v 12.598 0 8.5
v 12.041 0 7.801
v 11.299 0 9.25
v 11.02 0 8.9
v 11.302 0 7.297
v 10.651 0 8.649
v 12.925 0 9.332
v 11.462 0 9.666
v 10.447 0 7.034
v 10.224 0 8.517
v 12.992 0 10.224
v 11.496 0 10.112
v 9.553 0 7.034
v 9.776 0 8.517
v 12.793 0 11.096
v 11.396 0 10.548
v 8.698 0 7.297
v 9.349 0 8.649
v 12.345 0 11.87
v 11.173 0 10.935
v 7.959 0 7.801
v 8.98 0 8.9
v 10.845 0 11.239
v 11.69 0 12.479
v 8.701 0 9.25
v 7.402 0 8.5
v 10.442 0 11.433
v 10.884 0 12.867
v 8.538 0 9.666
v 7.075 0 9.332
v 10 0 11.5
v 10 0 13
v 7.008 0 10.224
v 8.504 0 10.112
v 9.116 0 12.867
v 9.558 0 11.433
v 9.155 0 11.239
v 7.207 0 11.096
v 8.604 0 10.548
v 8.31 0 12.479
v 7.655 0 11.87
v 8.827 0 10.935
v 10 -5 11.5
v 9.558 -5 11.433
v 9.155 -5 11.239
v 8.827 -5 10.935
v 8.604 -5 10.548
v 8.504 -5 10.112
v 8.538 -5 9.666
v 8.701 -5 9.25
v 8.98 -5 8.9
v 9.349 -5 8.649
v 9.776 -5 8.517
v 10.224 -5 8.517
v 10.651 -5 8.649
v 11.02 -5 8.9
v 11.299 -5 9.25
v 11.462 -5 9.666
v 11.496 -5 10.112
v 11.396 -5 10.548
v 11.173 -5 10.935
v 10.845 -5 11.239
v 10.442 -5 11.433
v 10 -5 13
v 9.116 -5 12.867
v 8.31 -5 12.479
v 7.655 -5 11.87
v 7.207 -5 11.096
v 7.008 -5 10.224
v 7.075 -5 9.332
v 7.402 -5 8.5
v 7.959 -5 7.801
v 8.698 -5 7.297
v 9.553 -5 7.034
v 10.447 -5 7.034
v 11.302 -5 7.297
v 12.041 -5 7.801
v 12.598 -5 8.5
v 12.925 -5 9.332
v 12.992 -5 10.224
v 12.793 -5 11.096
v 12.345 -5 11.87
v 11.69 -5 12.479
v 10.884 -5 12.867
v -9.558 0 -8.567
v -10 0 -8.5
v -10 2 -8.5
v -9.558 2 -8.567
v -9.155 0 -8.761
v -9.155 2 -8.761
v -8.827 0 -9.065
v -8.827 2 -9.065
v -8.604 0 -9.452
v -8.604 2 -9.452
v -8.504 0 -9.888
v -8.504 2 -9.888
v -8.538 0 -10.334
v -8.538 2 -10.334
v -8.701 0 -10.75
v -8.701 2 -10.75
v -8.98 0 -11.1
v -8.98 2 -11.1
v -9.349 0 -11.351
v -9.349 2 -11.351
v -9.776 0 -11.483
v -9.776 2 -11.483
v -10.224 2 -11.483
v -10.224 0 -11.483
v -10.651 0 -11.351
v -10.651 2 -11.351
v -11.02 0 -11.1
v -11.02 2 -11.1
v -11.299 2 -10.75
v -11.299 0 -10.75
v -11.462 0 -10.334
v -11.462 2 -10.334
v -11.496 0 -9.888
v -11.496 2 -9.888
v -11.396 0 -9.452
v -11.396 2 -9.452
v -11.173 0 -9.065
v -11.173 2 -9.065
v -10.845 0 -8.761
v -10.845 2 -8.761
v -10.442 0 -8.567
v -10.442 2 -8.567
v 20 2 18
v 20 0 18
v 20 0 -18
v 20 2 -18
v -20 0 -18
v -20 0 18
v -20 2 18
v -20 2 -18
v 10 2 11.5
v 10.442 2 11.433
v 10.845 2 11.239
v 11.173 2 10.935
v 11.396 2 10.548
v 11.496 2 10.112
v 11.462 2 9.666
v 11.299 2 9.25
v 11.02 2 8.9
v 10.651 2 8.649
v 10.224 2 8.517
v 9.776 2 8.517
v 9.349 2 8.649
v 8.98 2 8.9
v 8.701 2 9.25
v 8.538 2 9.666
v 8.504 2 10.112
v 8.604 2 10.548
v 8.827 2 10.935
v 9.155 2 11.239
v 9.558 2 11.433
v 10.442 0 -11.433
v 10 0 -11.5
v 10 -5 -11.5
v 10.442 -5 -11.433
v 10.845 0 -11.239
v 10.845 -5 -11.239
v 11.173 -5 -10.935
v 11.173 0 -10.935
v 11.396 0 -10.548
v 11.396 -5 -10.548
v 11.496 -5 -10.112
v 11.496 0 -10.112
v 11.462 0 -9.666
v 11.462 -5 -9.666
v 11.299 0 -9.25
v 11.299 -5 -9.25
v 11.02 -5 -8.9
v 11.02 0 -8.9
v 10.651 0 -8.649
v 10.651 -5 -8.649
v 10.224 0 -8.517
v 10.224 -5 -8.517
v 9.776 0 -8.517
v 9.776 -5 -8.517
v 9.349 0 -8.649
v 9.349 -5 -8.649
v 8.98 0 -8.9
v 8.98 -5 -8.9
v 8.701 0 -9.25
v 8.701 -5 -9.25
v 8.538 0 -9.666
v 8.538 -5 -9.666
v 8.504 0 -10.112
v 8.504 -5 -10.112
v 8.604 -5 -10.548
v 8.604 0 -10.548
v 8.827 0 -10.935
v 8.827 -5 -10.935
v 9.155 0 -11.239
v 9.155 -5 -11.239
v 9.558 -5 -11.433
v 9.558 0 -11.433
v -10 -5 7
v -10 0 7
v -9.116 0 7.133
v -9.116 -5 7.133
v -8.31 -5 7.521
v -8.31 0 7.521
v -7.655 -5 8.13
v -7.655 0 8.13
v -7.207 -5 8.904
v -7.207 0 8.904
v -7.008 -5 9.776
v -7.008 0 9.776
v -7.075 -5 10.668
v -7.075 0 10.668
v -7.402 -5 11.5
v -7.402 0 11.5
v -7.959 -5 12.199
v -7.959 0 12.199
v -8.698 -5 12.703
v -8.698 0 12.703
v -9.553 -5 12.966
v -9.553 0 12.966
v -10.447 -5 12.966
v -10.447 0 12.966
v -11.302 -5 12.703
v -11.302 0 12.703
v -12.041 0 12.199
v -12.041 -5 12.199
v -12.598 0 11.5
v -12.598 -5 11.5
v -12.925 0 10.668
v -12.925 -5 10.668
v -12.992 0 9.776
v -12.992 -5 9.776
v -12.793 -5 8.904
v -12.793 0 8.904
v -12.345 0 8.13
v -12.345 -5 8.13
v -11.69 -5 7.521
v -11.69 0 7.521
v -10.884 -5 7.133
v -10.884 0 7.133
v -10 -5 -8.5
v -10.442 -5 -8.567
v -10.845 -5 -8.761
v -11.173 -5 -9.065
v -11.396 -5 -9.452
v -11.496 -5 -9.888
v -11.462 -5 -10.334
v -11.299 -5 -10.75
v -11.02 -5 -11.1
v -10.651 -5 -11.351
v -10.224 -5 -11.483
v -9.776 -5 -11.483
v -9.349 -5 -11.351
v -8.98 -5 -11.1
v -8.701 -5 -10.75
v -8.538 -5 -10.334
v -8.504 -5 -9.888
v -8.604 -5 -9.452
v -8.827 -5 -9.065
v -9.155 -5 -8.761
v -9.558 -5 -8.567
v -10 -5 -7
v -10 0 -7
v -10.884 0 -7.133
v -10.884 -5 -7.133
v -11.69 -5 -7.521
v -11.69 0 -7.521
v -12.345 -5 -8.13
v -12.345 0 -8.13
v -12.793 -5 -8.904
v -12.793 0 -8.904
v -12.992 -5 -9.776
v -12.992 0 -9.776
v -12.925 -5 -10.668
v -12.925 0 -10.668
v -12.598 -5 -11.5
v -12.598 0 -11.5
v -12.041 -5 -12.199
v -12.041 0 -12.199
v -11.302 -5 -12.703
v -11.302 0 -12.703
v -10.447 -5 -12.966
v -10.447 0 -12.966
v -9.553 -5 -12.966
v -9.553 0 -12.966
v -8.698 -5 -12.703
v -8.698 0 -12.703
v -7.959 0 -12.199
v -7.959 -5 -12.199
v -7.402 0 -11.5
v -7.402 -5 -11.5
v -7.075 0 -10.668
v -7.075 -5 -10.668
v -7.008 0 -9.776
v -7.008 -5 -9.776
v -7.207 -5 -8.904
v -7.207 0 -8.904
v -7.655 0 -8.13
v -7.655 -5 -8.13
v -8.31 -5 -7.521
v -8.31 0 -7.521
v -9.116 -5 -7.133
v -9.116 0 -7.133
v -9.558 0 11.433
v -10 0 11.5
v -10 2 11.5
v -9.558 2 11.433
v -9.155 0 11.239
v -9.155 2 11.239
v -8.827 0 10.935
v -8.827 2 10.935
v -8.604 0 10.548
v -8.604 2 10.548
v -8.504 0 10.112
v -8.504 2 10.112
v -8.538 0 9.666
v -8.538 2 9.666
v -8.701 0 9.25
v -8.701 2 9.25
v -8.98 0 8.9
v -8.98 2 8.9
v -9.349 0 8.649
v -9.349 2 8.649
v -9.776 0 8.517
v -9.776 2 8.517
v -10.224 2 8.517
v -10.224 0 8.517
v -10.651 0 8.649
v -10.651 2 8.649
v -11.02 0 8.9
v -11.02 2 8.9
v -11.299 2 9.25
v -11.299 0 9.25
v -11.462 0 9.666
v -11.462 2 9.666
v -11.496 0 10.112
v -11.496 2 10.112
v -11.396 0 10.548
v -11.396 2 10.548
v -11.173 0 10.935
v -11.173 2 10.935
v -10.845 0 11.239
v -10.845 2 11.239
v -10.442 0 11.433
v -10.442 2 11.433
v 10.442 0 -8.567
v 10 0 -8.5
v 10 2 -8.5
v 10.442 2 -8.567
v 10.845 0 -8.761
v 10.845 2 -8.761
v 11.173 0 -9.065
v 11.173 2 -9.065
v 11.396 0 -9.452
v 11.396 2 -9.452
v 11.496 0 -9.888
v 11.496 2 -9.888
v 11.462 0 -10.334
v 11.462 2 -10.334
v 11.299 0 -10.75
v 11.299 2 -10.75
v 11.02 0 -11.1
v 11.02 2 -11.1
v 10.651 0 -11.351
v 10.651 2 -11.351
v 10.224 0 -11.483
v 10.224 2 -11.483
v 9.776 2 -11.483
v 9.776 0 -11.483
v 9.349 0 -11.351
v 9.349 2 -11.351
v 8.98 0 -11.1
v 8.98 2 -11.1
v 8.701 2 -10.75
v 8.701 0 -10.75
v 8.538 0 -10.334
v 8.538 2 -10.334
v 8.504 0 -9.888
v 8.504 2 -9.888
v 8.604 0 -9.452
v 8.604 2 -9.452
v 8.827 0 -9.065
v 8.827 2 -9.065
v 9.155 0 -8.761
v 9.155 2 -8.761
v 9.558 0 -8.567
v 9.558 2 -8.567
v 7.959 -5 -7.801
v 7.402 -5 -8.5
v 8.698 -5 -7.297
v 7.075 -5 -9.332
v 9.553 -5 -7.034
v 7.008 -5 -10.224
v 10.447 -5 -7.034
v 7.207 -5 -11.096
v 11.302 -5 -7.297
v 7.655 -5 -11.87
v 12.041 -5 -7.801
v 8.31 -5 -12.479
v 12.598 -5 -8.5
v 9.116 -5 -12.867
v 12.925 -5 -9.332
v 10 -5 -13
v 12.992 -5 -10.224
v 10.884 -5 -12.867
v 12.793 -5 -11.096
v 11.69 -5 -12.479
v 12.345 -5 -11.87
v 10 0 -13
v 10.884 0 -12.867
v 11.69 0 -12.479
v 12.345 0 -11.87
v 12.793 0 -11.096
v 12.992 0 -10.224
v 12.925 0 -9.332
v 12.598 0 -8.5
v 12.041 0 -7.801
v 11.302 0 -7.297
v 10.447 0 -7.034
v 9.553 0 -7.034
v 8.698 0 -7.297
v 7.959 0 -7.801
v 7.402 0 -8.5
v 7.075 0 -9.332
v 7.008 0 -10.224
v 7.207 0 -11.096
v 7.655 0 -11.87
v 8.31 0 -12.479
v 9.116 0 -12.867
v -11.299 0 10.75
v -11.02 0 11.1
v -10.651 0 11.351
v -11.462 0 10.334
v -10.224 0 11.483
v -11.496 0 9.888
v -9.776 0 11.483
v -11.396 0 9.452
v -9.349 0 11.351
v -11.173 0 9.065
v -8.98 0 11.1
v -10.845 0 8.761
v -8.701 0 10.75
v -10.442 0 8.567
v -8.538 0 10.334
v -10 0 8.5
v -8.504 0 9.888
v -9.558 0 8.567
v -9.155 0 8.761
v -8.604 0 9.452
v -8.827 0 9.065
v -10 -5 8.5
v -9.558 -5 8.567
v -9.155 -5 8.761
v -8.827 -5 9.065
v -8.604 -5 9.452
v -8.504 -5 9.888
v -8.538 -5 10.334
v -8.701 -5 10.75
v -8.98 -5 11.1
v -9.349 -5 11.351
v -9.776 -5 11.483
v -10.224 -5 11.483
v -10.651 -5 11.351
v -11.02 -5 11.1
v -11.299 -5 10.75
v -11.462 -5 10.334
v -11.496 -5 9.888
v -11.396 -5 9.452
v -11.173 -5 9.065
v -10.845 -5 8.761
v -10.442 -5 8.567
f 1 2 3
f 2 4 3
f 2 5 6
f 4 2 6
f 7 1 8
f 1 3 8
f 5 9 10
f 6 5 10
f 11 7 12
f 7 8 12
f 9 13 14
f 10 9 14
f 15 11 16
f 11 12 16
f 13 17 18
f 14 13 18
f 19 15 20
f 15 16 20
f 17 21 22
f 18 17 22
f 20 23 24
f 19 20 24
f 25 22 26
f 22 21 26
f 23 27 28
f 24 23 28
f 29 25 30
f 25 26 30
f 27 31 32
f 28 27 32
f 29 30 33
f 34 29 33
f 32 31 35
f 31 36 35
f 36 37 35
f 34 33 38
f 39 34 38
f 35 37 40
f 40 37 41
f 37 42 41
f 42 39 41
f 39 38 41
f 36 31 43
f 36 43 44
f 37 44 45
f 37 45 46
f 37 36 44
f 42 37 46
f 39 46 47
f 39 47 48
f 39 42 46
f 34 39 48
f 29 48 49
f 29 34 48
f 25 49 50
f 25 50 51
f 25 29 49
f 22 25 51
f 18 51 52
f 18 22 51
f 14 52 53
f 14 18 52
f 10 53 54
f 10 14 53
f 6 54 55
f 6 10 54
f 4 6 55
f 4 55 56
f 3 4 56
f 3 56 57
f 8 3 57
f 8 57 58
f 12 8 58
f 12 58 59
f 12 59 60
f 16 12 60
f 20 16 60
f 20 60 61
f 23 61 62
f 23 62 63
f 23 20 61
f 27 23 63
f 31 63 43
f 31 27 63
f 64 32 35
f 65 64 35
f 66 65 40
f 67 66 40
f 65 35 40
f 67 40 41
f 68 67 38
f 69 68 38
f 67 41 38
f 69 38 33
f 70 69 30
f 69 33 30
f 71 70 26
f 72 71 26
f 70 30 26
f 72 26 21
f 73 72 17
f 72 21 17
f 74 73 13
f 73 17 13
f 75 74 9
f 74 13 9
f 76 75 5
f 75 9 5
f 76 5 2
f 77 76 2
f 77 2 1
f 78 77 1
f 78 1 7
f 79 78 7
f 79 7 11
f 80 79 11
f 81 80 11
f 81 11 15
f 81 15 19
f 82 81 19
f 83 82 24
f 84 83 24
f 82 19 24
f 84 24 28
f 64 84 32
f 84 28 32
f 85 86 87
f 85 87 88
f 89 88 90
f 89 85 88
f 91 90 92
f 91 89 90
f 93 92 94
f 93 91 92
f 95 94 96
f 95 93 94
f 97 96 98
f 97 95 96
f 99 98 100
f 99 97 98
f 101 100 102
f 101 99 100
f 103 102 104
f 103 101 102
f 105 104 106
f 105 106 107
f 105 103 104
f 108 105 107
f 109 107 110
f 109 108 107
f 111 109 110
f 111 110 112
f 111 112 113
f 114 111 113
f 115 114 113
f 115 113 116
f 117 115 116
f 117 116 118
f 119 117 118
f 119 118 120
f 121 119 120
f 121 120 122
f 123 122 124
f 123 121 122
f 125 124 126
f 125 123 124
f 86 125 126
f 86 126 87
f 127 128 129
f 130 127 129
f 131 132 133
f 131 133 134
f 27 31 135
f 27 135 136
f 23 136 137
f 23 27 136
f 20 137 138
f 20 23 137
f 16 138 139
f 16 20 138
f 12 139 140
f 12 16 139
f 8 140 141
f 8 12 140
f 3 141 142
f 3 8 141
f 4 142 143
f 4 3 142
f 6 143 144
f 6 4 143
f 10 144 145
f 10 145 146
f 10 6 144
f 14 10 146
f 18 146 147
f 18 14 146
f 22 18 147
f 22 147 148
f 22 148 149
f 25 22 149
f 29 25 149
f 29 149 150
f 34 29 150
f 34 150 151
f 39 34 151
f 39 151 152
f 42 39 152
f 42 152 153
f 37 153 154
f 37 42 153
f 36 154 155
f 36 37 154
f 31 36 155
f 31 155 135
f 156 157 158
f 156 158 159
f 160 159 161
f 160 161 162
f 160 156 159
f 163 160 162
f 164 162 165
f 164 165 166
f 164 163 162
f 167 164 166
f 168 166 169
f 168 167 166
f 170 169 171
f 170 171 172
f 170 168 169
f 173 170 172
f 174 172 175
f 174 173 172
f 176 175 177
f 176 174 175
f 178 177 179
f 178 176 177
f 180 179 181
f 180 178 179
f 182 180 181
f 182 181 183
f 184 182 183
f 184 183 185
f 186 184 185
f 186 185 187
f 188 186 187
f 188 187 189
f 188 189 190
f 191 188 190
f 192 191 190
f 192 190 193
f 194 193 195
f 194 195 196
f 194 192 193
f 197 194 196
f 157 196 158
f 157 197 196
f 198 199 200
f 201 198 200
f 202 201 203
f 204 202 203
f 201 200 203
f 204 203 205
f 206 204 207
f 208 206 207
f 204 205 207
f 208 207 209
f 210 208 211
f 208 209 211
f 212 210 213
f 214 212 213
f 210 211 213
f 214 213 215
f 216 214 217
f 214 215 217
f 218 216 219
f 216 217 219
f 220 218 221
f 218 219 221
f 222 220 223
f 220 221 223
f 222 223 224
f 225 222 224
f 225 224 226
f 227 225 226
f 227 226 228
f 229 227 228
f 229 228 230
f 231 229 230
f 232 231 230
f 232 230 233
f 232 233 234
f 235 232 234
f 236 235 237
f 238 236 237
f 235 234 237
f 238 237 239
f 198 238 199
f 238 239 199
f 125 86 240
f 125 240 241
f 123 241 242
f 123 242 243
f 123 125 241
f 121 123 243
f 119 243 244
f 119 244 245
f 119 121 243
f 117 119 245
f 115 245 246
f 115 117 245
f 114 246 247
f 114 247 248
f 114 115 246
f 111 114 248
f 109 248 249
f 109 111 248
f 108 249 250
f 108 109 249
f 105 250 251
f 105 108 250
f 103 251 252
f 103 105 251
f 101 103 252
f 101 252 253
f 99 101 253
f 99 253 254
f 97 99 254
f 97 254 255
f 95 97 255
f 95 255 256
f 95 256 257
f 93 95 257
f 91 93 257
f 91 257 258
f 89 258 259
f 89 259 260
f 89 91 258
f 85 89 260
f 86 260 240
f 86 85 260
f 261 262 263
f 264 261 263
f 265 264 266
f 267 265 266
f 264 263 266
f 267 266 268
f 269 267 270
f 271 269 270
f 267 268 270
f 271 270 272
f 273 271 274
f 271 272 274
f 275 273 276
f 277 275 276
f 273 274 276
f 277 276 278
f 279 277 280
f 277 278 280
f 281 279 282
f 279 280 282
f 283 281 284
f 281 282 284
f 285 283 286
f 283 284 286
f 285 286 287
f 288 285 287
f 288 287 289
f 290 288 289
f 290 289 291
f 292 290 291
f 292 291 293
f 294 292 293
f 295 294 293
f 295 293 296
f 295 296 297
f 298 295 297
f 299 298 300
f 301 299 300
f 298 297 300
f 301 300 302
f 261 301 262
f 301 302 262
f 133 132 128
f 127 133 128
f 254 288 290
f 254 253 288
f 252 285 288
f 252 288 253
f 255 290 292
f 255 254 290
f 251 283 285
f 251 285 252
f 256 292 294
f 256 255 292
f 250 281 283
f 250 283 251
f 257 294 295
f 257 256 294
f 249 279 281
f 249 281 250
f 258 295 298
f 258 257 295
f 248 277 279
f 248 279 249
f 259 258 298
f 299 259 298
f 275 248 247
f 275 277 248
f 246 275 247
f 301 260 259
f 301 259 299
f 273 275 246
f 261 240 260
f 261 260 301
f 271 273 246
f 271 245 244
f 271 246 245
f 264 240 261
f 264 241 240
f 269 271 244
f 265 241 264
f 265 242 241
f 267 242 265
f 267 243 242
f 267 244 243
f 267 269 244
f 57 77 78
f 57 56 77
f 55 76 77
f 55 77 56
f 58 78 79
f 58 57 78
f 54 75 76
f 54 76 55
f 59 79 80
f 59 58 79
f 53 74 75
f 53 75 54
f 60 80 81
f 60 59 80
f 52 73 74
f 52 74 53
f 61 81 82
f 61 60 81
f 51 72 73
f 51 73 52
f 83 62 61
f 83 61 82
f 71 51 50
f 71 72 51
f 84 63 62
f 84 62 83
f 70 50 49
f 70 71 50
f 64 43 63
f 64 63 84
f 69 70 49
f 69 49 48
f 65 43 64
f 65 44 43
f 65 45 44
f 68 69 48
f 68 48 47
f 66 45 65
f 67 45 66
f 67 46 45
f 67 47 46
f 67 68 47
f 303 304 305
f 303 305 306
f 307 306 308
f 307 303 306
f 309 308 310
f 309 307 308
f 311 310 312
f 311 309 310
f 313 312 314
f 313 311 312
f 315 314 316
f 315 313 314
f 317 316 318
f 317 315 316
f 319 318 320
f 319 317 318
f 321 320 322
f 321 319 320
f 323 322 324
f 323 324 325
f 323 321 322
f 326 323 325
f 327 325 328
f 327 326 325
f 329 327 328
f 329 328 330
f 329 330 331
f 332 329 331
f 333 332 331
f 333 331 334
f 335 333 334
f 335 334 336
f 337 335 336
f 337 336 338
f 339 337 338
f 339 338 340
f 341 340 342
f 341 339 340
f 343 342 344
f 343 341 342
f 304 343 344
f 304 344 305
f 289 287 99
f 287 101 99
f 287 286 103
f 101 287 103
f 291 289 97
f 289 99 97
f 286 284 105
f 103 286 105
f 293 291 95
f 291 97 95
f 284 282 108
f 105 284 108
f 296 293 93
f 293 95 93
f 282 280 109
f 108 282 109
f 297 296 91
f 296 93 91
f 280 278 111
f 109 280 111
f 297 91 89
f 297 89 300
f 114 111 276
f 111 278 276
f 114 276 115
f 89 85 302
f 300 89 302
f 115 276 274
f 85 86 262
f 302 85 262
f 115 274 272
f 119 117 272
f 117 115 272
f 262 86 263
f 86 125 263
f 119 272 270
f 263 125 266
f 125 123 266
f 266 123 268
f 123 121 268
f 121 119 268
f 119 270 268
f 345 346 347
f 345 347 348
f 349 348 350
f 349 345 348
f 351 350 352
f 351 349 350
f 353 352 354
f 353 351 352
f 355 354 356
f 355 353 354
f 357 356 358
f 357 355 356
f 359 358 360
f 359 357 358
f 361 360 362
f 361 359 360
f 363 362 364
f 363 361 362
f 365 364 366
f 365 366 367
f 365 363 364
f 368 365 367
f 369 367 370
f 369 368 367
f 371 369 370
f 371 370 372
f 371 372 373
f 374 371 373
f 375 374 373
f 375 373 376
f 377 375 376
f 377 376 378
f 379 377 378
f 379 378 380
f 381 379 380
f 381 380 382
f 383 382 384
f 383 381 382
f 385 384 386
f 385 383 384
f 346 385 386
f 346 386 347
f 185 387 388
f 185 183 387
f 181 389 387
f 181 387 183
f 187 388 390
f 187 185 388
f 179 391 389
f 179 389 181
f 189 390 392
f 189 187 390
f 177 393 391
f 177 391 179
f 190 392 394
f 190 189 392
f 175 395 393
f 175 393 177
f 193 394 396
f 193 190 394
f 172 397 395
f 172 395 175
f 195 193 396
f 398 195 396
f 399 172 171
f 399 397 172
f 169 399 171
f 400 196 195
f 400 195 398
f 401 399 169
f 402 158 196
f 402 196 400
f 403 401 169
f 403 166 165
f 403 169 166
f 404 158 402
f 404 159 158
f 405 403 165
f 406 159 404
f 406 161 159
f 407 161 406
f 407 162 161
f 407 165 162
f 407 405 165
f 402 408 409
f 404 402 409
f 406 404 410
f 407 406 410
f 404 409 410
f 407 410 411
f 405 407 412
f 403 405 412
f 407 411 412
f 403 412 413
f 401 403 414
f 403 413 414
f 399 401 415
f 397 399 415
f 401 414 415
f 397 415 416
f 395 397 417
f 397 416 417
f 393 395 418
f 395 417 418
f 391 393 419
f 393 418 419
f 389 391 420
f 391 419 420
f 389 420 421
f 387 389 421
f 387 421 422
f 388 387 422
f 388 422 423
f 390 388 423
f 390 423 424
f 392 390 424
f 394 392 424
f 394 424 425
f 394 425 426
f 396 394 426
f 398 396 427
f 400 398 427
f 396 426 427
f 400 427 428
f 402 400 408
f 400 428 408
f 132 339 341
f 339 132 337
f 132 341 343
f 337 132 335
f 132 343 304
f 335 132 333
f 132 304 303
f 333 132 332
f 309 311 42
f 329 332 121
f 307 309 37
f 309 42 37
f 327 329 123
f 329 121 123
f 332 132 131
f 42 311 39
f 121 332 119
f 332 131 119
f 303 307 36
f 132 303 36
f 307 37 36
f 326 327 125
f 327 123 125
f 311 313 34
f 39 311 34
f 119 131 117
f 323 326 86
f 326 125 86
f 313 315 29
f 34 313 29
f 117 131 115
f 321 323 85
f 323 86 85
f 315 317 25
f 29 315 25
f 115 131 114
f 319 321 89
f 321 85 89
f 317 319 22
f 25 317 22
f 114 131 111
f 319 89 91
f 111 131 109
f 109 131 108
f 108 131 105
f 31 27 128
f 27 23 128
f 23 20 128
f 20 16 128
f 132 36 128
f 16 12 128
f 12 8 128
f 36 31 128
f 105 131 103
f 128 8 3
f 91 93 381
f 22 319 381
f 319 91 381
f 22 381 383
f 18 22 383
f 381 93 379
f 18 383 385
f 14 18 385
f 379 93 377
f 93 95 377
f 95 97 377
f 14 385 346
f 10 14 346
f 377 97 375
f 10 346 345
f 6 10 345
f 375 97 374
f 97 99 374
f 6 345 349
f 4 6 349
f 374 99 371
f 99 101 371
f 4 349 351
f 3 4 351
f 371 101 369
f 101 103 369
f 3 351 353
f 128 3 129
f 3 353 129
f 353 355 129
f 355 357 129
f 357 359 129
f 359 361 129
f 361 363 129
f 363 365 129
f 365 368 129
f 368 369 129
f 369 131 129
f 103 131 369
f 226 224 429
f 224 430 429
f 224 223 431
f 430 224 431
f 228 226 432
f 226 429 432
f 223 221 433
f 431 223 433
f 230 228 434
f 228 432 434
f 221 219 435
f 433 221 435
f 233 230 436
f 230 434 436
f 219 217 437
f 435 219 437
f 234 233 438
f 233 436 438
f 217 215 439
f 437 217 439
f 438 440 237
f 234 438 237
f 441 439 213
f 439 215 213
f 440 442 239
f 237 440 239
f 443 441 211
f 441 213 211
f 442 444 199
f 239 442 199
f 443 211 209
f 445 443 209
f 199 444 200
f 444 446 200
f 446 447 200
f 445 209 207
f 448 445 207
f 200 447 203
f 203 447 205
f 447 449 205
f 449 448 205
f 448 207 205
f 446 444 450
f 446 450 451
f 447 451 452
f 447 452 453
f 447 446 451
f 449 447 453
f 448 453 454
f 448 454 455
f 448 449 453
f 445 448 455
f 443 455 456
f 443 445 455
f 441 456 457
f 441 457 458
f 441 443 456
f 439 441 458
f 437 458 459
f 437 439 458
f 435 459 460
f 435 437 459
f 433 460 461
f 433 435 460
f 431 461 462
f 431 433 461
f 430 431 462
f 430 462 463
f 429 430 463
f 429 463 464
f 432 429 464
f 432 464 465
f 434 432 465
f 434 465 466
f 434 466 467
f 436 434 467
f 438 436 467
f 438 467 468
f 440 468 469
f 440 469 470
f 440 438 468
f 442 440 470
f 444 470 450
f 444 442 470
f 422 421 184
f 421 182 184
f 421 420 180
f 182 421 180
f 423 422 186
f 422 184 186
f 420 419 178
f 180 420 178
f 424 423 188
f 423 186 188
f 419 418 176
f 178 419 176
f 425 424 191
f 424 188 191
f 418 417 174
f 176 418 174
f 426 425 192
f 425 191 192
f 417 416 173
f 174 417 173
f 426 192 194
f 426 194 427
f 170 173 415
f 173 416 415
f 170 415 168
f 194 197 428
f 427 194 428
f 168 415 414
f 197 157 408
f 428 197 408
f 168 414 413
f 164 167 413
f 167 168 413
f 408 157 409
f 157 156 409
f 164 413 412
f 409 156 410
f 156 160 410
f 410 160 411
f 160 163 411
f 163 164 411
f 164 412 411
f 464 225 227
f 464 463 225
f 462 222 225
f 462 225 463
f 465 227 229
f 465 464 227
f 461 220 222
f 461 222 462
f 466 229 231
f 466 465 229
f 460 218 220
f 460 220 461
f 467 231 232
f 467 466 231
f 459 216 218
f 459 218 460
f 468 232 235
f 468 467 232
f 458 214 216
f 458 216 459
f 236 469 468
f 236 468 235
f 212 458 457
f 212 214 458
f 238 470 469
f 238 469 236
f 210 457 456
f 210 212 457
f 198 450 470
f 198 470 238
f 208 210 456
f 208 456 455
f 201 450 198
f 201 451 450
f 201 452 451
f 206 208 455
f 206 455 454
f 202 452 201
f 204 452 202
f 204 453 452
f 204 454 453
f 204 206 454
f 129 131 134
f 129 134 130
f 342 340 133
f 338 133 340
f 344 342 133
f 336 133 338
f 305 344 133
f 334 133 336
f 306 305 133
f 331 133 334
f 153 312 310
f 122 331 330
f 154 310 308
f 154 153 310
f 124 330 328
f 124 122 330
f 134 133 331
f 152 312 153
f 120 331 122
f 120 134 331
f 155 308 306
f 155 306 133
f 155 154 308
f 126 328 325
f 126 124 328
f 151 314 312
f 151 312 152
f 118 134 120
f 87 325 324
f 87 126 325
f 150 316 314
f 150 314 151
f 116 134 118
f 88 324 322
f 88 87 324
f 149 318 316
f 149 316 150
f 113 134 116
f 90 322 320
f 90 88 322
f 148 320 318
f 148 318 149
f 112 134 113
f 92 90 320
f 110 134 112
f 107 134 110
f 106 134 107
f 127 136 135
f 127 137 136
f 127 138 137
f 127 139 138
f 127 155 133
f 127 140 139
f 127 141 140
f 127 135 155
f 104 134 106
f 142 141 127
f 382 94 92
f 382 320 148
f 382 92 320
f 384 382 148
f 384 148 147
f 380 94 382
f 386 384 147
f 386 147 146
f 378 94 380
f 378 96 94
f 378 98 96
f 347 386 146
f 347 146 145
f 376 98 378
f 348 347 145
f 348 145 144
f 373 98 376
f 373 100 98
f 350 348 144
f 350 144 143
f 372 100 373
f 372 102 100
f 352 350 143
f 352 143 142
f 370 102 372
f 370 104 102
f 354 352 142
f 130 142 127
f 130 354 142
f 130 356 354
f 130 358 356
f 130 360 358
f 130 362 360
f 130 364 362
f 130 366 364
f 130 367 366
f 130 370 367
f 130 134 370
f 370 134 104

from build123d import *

# Parameters (mm, degrees)
SKETCH_1_W        = 40
SKETCH_1_H        = 36
SKETCH_1_R        = 1.5
EXTRUDE_1_DEPTH   = 2
SKETCH_2_R        = 3
SKETCH_2_R_2      = 1.5
EXTRUDE_2_DEPTH   = 5
EXTRUDE_2_2_DEPTH = 5
EXTRUDE_2_3_DEPTH = 5
EXTRUDE_2_4_DEPTH = 5


with BuildPart() as part:
    # 草图1 → 凸台-拉伸1 (new body)
    with BuildSketch(Plane(origin=(0, 0, 0), x_dir=(1, 0, 0), z_dir=(0, 1, 0))):
        Rectangle(SKETCH_1_W, SKETCH_1_H)
        with Locations(Location((-10, 10, 0), (0, 0, 270))):
            Circle(SKETCH_1_R, mode=Mode.SUBTRACT)
        with Locations(Location((10, 10, 0), (0, 0, 270))):
            Circle(SKETCH_1_R, mode=Mode.SUBTRACT)
        with Locations(Location((10, -10, 0), (0, 0, 270))):
            Circle(SKETCH_1_R, mode=Mode.SUBTRACT)
        with Locations(Location((-10, -10, 0), (0, 0, 270))):
            Circle(SKETCH_1_R, mode=Mode.SUBTRACT)
    extrude(amount=EXTRUDE_1_DEPTH)


with BuildPart() as body_2:
    # 草图2 → 凸台-拉伸2 (new body)
    with BuildSketch(Plane.XZ):
        with Locations(Location((-10, 10, 0), (0, 0, 270))):
            Circle(SKETCH_2_R)
        with Locations(Location((-10, 10, 0), (0, 0, 270))):
            Circle(SKETCH_2_R_2, mode=Mode.SUBTRACT)
    extrude(amount=EXTRUDE_2_DEPTH)


with BuildPart() as body_3:
    # 草图2 → Extrude 2 2 (new body)
    with BuildSketch(Plane.XZ):
        with Locations(Location((10, 10, 0), (0, 0, 90))):
            Circle(SKETCH_2_R)
        with Locations(Location((10, 10, 0), (0, 0, 90))):
            Circle(SKETCH_2_R_2, mode=Mode.SUBTRACT)
    extrude(amount=EXTRUDE_2_2_DEPTH)


with BuildPart() as body_4:
    # 草图2 → Extrude 2 3 (new body)
    with BuildSketch(Plane.XZ):
        with Locations(Location((10, -10, 0), (0, 0, 270))):
            Circle(SKETCH_2_R)
        with Locations(Location((10, -10, 0), (0, 0, 270))):
            Circle(SKETCH_2_R_2, mode=Mode.SUBTRACT)
    extrude(amount=EXTRUDE_2_3_DEPTH)


with BuildPart() as body_5:
    # 草图2 → Extrude 2 4 (new body)
    with BuildSketch(Plane.XZ):
        with Locations(Location((-10, -10, 0), (0, 0, 90))):
            Circle(SKETCH_2_R)
        with Locations(Location((-10, -10, 0), (0, 0, 90))):
            Circle(SKETCH_2_R_2, mode=Mode.SUBTRACT)
    extrude(amount=EXTRUDE_2_4_DEPTH)


solid = Compound([part.part, body_2.part, body_3.part, body_4.part, body_5.part])
